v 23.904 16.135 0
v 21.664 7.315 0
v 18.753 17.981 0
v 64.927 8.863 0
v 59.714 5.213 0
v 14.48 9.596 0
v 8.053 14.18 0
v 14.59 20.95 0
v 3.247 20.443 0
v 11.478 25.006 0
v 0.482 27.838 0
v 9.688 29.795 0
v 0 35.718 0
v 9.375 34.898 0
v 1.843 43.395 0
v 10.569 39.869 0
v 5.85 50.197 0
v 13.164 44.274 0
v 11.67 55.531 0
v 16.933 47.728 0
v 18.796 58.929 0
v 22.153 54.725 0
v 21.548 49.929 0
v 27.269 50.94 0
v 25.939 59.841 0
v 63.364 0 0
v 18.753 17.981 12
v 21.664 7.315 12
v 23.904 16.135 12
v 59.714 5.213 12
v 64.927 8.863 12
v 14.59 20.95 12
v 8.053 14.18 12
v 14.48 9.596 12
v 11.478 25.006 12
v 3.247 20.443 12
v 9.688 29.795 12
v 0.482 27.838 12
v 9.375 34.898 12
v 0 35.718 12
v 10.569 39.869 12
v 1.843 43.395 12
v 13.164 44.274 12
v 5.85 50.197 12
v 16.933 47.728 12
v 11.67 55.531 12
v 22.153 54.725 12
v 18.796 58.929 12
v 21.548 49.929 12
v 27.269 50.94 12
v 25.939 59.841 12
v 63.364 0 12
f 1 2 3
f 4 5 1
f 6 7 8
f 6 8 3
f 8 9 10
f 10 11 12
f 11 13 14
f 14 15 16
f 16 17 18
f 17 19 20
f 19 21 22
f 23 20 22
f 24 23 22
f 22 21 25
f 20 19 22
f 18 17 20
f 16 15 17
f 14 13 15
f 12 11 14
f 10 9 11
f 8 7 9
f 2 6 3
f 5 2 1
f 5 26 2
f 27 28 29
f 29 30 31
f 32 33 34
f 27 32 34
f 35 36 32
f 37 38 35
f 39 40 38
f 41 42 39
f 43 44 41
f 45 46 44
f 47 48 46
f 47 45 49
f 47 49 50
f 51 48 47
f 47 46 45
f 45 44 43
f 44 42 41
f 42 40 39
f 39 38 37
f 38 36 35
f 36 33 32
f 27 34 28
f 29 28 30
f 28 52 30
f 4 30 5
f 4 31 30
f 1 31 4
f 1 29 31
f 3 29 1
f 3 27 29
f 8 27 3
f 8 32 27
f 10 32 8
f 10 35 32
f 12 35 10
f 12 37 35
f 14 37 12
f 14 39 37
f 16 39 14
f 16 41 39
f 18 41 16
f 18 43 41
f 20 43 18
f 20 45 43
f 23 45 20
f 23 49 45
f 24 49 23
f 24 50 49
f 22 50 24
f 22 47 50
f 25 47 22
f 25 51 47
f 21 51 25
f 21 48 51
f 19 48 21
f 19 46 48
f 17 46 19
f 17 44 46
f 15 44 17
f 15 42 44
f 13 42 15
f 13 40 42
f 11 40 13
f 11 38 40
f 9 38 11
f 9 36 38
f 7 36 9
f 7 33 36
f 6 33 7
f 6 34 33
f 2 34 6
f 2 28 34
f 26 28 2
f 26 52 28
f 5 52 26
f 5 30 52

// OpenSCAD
$fn = 32;

// ----------------------------------------------------------------------
// Hook plate: curl radius 22 mm over 170 degrees, 9 mm thick band
// ----------------------------------------------------------------------

// --- parameters (mm) ---
profile_height = 12;      // extrusion height
profile_points = 26;      // points of the closed outline

profile = [[22.153, 54.725], [25.939, 59.841], [18.796, 58.929], [11.67, 55.531], [5.85, 50.197], [1.843, 43.395], [0, 35.718], [0.482, 27.838], [3.247, 20.443], [8.053, 14.18], [14.48, 9.596], [21.664, 7.315], [63.364, 0], [59.714, 5.213], [64.927, 8.863], [23.904, 16.135], [18.753, 17.981], [14.59, 20.95], [11.478, 25.006], [9.688, 29.795], [9.375, 34.898], [10.569, 39.869], [13.164, 44.274], [16.933, 47.728], [21.548, 49.929], [27.269, 50.94]];  // single closed polygon, 26 points, counter clockwise

// --- the one profile operation ---
linear_extrude(height = profile_height) polygon(points = profile);
